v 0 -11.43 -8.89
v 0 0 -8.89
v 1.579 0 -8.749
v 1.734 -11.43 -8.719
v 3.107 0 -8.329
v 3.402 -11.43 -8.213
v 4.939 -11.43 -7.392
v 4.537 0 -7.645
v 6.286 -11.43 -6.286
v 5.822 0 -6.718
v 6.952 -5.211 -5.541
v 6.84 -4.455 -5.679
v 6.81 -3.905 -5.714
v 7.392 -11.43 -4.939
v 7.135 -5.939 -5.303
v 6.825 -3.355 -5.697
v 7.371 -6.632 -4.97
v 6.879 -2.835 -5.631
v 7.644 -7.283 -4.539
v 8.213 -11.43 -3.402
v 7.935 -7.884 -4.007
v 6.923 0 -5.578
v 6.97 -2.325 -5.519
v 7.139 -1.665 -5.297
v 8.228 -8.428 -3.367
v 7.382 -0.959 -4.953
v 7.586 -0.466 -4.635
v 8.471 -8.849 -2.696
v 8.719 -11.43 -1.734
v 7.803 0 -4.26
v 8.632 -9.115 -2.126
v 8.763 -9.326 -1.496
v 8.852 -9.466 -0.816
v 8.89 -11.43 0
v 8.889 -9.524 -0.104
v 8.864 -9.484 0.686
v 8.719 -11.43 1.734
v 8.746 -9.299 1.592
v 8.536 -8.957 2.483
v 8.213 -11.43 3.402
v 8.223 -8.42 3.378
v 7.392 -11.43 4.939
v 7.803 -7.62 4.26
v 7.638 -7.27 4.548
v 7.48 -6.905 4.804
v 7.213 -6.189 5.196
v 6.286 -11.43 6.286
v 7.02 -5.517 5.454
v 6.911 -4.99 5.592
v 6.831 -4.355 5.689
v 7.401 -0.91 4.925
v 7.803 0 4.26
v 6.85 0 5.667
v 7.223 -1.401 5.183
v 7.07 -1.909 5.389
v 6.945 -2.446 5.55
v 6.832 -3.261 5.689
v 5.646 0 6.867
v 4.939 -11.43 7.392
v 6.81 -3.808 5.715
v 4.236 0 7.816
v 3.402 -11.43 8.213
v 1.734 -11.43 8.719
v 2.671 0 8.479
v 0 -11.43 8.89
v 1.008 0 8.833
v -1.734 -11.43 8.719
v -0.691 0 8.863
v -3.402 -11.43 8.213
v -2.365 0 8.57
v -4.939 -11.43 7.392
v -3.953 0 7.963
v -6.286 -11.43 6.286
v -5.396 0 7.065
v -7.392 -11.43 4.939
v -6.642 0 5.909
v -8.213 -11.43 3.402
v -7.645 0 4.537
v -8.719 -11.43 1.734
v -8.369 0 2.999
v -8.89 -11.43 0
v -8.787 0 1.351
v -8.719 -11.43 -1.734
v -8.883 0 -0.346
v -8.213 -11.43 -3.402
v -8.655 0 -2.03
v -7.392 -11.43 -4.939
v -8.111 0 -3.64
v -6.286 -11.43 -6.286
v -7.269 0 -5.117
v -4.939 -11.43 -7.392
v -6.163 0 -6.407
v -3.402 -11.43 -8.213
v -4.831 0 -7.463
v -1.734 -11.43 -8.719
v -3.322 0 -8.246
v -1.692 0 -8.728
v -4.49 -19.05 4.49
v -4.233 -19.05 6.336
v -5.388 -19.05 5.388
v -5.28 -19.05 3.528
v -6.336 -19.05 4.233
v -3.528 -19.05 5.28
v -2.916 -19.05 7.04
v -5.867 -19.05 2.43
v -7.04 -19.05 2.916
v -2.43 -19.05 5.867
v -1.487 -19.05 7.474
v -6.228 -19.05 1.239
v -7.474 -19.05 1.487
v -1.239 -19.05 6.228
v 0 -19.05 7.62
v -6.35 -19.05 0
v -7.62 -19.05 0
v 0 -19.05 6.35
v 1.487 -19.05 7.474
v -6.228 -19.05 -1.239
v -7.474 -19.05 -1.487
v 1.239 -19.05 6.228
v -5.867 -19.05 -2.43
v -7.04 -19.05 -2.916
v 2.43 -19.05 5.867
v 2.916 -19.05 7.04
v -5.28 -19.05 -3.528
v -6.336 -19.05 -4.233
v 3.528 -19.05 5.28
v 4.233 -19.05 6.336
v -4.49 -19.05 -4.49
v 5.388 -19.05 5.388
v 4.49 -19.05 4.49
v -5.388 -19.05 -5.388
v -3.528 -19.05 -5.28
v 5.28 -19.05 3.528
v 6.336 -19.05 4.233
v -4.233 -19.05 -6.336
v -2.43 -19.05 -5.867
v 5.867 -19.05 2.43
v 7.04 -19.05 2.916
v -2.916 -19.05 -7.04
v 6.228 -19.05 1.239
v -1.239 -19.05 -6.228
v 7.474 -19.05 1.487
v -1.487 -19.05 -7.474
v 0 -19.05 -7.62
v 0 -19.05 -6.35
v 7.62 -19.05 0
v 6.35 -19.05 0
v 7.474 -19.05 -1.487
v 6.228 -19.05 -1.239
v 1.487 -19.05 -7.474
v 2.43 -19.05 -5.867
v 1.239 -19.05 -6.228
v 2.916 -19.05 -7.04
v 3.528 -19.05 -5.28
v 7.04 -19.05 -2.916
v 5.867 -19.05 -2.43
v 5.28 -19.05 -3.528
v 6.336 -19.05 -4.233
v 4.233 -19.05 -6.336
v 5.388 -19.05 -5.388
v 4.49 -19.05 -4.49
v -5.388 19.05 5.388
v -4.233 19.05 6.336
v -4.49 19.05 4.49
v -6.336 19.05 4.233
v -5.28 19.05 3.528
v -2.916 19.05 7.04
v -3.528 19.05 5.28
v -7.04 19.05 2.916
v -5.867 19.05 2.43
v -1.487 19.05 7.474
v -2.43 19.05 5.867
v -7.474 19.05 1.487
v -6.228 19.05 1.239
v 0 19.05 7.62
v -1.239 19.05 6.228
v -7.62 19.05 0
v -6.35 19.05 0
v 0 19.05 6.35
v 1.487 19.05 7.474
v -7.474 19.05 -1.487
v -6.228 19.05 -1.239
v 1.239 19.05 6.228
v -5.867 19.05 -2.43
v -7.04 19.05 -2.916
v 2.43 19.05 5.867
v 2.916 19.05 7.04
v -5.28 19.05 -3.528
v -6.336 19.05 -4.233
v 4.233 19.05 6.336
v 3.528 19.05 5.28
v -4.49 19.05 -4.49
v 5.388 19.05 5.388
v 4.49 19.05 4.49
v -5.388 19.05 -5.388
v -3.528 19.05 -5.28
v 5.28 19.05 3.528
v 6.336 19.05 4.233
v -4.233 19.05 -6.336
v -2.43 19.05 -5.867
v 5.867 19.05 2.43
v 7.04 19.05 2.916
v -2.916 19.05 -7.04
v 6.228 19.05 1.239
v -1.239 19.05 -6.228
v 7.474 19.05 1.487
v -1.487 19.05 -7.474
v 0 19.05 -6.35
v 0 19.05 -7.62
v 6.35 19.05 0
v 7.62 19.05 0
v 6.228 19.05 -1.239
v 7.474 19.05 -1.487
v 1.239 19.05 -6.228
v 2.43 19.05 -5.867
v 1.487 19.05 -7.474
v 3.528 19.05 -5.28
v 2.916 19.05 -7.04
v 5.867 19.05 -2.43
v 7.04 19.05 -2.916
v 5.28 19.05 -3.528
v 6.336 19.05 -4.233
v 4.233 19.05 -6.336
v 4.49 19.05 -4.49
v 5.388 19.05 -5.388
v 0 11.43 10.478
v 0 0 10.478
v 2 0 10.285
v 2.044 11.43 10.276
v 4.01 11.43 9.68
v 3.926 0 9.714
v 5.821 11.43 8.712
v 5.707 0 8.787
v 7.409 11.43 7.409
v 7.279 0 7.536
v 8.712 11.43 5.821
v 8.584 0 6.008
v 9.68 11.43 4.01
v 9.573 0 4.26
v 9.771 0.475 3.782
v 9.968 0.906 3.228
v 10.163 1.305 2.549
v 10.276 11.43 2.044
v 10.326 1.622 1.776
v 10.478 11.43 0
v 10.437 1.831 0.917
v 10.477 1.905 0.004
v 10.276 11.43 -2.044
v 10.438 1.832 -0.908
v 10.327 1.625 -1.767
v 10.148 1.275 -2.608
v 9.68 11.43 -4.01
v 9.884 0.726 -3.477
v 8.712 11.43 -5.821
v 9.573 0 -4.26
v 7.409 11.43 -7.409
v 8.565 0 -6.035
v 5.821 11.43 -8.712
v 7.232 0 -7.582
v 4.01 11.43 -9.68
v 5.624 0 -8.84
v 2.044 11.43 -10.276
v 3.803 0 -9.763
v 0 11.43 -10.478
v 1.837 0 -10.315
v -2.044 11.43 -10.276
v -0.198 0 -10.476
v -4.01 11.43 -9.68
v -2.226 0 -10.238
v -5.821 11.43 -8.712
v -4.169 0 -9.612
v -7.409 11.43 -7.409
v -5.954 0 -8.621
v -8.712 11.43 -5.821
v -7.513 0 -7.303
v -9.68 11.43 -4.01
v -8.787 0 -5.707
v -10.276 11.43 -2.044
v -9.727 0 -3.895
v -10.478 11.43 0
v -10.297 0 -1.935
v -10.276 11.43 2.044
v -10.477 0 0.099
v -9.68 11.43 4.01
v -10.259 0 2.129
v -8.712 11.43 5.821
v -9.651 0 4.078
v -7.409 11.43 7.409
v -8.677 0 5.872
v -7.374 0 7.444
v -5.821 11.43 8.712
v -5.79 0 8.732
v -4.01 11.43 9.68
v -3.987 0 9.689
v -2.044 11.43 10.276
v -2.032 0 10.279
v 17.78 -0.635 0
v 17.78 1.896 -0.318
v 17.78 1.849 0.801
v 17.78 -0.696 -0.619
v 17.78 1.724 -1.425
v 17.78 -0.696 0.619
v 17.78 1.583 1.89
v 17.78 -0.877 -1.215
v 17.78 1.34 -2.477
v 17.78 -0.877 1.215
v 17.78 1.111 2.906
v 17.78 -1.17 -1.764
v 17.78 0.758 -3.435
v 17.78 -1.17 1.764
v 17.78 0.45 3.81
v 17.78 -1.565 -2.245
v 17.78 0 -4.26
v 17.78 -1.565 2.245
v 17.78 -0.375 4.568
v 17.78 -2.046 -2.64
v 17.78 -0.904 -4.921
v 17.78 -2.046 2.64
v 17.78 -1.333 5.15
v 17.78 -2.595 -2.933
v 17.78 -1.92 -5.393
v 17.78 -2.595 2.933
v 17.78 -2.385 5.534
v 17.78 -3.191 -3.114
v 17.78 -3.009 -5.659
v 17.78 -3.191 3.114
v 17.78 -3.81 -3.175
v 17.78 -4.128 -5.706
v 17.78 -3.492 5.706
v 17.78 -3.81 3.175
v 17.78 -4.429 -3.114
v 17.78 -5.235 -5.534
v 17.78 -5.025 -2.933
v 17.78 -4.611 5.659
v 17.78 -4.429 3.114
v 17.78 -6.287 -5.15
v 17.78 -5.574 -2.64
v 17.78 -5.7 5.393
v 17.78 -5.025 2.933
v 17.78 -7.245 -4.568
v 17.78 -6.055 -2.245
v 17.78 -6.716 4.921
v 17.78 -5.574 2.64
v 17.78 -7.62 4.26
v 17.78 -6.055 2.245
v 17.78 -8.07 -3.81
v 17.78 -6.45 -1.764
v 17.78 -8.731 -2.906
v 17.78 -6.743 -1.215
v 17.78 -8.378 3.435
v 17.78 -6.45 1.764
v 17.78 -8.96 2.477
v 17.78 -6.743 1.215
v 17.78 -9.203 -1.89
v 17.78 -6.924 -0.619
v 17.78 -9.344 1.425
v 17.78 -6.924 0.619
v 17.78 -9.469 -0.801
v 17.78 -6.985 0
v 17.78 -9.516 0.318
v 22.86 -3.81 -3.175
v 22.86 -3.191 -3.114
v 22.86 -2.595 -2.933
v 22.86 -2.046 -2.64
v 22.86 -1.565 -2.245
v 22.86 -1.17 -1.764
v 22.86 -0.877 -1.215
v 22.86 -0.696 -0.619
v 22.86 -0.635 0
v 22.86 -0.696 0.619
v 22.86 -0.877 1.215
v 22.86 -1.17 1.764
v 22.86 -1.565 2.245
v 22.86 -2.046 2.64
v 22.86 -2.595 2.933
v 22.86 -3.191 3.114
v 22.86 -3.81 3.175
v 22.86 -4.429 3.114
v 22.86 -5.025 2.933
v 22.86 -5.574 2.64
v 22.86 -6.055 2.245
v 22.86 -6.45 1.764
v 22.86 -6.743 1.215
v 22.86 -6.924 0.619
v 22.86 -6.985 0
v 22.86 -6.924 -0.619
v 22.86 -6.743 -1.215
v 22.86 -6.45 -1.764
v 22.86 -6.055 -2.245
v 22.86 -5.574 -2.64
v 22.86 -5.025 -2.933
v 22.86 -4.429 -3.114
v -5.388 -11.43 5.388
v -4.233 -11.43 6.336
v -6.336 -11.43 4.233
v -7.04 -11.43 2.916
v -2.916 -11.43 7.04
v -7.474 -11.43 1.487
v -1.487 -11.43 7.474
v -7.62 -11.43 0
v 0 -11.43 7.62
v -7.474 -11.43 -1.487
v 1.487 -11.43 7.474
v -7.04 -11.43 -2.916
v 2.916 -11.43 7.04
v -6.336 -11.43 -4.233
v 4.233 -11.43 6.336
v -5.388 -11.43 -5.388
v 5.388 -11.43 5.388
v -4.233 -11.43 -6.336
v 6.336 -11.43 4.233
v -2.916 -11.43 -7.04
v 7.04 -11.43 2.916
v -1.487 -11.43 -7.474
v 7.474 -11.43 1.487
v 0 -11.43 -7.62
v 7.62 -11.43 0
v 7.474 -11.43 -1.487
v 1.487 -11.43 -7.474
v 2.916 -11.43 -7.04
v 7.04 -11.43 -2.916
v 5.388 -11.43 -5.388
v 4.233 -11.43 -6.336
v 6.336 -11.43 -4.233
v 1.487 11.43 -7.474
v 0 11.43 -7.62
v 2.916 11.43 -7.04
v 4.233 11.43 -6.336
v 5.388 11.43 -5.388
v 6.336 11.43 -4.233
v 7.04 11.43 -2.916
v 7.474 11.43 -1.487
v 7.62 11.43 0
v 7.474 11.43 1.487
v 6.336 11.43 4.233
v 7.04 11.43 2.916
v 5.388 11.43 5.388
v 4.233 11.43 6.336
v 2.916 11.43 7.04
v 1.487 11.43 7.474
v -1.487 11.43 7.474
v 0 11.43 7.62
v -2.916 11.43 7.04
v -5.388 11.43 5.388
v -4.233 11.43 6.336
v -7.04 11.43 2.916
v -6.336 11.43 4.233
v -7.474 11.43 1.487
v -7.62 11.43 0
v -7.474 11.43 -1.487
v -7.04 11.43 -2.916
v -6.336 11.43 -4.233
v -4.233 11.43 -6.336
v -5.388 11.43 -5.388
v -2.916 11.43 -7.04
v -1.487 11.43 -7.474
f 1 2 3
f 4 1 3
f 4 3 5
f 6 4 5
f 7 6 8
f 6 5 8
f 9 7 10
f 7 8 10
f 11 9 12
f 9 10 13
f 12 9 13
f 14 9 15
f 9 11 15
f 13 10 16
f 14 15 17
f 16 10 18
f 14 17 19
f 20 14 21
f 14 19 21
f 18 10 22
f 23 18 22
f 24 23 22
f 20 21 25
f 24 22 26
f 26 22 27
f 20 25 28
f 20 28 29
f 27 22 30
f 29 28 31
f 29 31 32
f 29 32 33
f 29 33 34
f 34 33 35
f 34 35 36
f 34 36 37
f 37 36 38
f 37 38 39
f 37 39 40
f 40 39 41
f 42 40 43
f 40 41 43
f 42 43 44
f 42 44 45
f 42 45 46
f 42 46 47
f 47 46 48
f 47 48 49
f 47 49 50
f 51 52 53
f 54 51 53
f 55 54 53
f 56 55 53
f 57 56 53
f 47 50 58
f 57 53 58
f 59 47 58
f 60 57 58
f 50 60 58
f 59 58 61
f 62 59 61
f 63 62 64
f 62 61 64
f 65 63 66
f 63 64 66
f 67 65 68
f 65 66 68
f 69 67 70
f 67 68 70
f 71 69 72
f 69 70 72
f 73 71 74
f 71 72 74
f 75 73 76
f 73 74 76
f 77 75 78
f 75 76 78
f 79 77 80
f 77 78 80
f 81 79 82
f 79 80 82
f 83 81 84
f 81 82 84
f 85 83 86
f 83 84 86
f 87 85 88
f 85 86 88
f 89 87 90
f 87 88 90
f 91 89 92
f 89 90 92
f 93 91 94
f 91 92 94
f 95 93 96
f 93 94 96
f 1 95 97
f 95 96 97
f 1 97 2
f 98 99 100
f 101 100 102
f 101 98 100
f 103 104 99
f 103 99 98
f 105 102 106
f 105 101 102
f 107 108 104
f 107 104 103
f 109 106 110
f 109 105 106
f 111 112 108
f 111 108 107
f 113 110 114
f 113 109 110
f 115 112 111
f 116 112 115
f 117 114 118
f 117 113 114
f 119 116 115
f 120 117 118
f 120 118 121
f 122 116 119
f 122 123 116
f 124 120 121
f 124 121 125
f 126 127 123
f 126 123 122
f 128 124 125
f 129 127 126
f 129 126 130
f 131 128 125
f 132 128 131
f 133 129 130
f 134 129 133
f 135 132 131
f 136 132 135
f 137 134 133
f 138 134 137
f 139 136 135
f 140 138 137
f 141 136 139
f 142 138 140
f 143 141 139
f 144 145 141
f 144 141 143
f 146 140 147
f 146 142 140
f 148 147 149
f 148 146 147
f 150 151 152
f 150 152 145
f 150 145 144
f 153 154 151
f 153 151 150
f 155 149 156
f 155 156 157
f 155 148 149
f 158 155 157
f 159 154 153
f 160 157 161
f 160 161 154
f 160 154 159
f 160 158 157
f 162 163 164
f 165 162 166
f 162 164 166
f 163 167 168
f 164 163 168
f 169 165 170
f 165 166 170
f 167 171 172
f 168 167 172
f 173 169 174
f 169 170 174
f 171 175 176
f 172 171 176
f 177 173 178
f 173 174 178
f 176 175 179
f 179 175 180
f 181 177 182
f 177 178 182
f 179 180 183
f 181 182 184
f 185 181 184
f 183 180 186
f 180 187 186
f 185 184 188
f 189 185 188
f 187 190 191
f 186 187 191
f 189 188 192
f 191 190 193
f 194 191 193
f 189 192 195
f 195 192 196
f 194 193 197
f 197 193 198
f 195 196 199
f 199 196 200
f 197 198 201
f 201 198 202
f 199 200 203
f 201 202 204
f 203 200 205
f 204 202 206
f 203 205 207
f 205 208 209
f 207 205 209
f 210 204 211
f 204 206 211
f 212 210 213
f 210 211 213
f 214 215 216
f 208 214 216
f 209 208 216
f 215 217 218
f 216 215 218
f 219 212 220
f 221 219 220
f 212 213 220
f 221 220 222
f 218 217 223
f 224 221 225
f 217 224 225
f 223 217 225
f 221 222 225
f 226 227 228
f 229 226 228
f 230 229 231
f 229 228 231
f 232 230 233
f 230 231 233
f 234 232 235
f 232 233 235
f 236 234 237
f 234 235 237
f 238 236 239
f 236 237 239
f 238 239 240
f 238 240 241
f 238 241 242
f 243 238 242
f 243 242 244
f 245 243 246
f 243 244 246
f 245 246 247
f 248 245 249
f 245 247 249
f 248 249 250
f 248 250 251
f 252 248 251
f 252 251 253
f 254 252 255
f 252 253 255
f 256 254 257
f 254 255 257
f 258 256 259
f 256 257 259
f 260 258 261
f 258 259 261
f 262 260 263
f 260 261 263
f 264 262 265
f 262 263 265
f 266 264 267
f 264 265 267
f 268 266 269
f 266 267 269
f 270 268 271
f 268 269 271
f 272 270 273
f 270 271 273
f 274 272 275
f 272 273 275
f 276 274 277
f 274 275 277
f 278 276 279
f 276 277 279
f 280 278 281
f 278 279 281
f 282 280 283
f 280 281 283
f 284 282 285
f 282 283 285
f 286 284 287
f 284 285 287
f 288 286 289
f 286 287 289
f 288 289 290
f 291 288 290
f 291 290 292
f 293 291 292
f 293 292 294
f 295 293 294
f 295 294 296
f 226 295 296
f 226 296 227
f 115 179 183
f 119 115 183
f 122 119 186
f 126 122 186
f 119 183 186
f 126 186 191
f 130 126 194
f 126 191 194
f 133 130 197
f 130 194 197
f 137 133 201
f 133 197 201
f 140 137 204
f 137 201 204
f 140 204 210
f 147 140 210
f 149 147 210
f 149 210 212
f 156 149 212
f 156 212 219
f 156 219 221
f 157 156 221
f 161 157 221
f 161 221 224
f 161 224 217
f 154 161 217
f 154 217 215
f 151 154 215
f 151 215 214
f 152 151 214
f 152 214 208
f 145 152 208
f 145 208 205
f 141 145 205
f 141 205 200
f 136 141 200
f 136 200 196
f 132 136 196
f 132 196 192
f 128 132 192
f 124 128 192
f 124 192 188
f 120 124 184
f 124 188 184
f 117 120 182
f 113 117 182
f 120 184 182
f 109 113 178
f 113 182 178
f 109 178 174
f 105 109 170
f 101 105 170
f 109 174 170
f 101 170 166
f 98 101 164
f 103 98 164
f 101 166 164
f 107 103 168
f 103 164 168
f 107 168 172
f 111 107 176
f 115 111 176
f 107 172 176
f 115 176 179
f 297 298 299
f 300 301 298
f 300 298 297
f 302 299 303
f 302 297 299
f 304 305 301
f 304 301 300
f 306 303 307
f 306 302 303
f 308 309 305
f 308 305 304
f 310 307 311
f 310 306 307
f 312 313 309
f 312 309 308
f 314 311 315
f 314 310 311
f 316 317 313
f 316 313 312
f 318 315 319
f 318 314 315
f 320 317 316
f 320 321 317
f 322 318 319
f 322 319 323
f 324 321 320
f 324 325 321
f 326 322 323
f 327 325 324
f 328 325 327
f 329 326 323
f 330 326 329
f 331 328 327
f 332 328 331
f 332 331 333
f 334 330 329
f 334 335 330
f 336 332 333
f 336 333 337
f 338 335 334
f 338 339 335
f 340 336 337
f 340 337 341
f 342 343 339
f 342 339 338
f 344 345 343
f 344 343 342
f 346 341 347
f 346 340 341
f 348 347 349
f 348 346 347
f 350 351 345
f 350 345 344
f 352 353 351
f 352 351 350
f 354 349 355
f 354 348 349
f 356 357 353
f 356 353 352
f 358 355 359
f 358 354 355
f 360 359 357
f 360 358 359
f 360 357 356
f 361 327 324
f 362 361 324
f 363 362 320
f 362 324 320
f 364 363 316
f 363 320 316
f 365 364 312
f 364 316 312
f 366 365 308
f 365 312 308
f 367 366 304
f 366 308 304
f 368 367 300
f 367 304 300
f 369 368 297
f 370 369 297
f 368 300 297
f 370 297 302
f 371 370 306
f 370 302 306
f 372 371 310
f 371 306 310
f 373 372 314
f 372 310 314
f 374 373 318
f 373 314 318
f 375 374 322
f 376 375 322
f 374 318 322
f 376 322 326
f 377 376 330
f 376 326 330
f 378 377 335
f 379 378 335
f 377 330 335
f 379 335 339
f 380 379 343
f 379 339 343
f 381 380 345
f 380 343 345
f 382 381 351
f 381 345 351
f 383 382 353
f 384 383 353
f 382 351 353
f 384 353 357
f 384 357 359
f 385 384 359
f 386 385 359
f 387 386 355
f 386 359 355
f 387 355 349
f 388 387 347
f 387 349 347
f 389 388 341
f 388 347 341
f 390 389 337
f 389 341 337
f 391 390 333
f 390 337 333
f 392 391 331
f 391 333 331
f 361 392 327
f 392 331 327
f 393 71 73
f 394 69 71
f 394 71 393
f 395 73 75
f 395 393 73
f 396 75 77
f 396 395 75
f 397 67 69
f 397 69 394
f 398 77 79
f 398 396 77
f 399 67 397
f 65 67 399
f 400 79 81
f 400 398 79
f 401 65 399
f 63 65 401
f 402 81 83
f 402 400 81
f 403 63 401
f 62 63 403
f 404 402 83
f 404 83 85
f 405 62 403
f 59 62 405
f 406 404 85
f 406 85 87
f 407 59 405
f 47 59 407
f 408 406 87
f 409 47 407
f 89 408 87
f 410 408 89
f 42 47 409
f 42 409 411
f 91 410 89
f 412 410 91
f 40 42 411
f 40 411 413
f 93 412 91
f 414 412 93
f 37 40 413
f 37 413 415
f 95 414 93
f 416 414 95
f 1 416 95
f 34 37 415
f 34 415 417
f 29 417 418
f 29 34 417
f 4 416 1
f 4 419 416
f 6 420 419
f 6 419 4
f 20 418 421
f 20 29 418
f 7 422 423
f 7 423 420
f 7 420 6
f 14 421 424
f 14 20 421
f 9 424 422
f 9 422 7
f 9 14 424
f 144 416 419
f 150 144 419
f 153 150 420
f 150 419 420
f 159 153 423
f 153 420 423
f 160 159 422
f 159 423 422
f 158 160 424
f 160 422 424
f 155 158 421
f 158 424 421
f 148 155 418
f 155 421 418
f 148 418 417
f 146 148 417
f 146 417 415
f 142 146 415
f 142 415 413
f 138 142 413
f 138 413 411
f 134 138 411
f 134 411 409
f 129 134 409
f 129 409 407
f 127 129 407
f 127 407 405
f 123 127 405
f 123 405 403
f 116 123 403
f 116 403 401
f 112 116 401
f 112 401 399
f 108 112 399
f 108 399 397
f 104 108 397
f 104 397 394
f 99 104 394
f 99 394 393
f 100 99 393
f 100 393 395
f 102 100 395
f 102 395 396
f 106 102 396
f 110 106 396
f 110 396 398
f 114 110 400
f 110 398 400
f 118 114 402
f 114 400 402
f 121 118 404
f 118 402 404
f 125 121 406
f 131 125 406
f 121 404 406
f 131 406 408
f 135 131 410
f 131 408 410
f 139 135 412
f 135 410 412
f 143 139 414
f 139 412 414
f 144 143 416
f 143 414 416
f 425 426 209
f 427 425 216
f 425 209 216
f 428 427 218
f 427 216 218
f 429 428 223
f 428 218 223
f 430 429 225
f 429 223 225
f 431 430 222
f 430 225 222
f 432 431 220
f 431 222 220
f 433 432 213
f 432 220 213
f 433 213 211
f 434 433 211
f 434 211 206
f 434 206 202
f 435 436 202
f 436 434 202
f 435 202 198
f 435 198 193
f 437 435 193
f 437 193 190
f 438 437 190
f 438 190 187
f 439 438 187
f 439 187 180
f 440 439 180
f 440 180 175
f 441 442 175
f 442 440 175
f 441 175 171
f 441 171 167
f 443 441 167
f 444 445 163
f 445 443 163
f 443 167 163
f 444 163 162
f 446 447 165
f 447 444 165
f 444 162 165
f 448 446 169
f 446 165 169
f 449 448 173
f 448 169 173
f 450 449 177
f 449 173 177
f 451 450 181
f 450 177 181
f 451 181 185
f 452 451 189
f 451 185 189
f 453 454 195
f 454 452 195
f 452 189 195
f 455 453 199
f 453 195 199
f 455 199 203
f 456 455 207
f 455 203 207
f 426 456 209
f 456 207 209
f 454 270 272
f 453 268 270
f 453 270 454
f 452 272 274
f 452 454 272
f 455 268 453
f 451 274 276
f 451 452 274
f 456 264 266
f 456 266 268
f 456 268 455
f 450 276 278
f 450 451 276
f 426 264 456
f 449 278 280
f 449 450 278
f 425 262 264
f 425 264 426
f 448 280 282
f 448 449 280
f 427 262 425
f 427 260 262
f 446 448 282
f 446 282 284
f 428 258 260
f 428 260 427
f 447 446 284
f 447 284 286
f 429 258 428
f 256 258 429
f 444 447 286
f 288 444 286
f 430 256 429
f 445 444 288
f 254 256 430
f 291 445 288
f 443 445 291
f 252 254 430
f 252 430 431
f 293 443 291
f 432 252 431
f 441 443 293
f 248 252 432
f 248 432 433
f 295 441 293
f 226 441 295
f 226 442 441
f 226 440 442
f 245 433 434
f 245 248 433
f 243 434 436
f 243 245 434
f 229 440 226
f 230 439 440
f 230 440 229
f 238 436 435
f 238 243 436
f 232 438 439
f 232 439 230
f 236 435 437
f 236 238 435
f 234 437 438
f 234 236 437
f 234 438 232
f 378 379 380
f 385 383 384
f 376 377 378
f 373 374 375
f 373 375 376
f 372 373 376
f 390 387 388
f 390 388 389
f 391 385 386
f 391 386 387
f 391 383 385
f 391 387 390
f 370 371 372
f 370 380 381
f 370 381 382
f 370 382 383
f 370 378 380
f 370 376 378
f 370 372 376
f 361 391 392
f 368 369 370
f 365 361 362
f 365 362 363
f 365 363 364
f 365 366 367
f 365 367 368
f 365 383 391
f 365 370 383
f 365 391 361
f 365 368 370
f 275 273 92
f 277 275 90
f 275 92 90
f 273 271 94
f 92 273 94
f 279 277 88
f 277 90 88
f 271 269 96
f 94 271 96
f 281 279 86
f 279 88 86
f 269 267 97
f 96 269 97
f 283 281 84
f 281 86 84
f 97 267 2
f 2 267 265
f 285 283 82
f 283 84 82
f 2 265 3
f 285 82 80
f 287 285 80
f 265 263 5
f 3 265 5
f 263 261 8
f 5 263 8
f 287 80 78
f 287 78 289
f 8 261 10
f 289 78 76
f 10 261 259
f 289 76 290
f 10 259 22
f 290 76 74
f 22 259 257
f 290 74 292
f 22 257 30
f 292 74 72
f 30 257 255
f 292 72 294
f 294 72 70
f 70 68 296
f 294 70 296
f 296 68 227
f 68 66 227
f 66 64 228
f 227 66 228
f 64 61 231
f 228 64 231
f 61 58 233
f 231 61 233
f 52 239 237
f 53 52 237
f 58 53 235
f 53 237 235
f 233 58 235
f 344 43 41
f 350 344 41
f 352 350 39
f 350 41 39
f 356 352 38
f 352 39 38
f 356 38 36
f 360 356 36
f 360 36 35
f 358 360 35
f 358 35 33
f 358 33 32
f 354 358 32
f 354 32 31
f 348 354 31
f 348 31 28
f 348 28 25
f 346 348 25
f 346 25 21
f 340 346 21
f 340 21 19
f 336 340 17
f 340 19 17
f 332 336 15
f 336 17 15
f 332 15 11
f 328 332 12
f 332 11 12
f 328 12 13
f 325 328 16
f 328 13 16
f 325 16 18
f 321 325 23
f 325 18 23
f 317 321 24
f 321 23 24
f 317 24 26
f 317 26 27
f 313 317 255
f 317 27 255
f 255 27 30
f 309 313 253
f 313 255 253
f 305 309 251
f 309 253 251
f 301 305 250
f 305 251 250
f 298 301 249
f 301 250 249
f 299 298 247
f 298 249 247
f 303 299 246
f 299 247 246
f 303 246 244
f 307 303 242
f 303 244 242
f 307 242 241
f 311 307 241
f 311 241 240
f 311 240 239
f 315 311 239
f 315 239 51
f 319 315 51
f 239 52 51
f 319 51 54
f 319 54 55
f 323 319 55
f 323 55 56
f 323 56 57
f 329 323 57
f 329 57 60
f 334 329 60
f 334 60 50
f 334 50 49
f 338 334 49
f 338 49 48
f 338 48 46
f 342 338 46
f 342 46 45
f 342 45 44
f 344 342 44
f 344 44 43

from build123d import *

# Parameters (mm, degrees)
SKETCH1_R                = 10.4775
BOSS_EXTRUDE1_DEPTH      = 11.43
SKETCH2_R                = 8.89
BOSS_EXTRUDE2_DEPTH      = 11.43
BOSS_EXTRUDE3_DEPTH      = 7.62
BOSS_EXTRUDE3_DEPTH_BACK = 30.48
SKETCH3_R                = 7.62
SKETCH4_R                = 5.715
BOSS_EXTRUDE4_DEPTH      = 17.78
SKETCH5_R                = 3.175
BOSS_EXTRUDE5_DEPTH      = 5.08
SKETCH6_R                = 6.35
CUT_EXTRUDE1_DEPTH       = 46.650494065


with BuildPart() as part:
    # Sketch1 → Boss-Extrude1 (new body)
    with BuildSketch(Plane(origin=(0, 0, 0), x_dir=(1, 0, 0), z_dir=(0, 1, 0))):
        with Locations(Location((0, 0, 0), (0, 0, 270))):
            Circle(SKETCH1_R)
    extrude(amount=BOSS_EXTRUDE1_DEPTH)

    # Sketch2 → Boss-Extrude2 (add)
    with BuildSketch(Plane.XZ):
        with Locations(Location((0, 0, 0), (0, 0, 270))):
            Circle(SKETCH2_R)
    extrude(amount=BOSS_EXTRUDE2_DEPTH)

    # Sketch3 → Boss-Extrude3 (add, two sides: drawn at the far end of the back side and taken through both)
    with BuildSketch(Plane.XZ.offset(11.43).offset(-BOSS_EXTRUDE3_DEPTH_BACK)):
        with Locations(Location((0, 0, 0), (0, 0, 270))):
            Circle(SKETCH3_R)
    extrude(amount=BOSS_EXTRUDE3_DEPTH + BOSS_EXTRUDE3_DEPTH_BACK)

    # Sketch4 → Boss-Extrude4 (add)
    with BuildSketch(Plane(origin=(0, 0, 0), x_dir=(0, 0, -1), z_dir=(1, 0, 0))):
        with Locations(Location((0, -3.81, 0), (0, 0, 221.810313572))):
            Circle(SKETCH4_R)
    extrude(amount=BOSS_EXTRUDE4_DEPTH)

    # Sketch5 → Boss-Extrude5 (add)
    with BuildSketch(Plane(origin=(17.78, 0, 0), x_dir=(0, 0, -1), z_dir=(1, 0, 0))):
        with Locations((0, -3.81)):
            Circle(SKETCH5_R)
    extrude(amount=BOSS_EXTRUDE5_DEPTH)

    # Sketch6 → Cut-Extrude1 (cut, through all)
    with BuildSketch(Plane(origin=(0, 19.05, 0), x_dir=(1, 0, 0), z_dir=(0, 1, 0))):
        with Locations(Location((0, 0, 0), (0, 0, 270))):
            Circle(SKETCH6_R)
    extrude(amount=-CUT_EXTRUDE1_DEPTH, mode=Mode.SUBTRACT)


solid = part.part
